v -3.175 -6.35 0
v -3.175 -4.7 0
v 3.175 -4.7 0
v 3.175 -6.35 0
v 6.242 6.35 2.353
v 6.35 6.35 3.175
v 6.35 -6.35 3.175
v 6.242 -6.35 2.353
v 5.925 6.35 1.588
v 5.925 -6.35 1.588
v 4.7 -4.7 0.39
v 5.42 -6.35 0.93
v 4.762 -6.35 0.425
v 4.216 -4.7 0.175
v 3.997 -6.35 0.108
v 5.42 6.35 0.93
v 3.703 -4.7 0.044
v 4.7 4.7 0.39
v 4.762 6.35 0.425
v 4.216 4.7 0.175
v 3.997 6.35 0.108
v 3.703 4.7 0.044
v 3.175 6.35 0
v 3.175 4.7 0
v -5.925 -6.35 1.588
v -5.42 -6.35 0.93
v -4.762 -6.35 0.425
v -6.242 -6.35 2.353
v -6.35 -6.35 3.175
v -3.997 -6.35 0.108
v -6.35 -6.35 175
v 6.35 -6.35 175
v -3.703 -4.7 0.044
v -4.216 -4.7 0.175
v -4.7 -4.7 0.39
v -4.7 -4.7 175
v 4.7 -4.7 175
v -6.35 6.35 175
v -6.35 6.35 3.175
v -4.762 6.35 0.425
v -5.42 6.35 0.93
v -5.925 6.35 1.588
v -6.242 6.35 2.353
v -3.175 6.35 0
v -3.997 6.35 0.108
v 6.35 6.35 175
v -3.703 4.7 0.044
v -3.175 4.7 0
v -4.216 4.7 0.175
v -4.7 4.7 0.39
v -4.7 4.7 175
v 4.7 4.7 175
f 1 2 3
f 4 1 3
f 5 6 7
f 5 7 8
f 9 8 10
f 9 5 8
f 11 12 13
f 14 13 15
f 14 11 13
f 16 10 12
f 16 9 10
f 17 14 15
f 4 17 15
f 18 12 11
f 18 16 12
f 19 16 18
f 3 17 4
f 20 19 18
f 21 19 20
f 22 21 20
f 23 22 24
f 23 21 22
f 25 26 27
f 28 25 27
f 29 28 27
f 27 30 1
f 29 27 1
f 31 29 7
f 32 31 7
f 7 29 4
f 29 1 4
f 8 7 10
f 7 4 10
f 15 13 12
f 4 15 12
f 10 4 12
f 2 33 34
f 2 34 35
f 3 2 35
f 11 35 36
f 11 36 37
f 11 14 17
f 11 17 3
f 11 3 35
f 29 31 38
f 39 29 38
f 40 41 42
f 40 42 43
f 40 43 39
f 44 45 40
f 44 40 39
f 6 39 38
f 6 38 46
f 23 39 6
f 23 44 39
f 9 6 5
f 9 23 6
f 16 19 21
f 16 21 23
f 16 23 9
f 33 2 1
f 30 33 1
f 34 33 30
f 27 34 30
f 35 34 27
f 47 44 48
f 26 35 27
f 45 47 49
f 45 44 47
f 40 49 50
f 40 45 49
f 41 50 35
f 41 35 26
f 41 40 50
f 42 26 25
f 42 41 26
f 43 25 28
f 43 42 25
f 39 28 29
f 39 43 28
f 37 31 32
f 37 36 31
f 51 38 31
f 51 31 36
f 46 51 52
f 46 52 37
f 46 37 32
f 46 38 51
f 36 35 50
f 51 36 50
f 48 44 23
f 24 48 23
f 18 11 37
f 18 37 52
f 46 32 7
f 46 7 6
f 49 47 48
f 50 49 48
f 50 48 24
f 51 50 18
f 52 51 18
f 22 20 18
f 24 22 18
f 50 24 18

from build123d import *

# Parameters (mm, degrees)
SKETCH1_W           = 12.7
SKETCH1_H           = 12.7
SKETCH1_W_2         = 9.4
SKETCH1_H_2         = 9.4
BOSS_EXTRUDE1_DEPTH = 175
CUT_EXTRUDE1_DEPTH  = 13.7


with BuildPart() as part:
    # Sketch1 → Boss-Extrude1 (new body)
    with BuildSketch(Plane.XY):
        Rectangle(SKETCH1_W, SKETCH1_H)
        Rectangle(SKETCH1_W_2, SKETCH1_H_2, mode=Mode.SUBTRACT)
    extrude(amount=BOSS_EXTRUDE1_DEPTH)

    # Sketch2 → Cut-Extrude1 (cut, through all)
    with BuildSketch(Plane(origin=(0, 6.35, 0), x_dir=(1, 0, 0), z_dir=(0, 1, 0))):
        with BuildLine():
            Line((-6.35, -3.175), (-6.35, 0))
            Line((-6.35, 0), (-3.175, 0))
            ThreePointArc((-3.175, 0), (-5.42006403, -0.92993597), (-6.35, -3.175))
        make_face()
        with BuildLine():
            Line((3.175, 0), (6.35, 0))
            Line((6.35, 0), (6.35, -3.175))
            ThreePointArc((6.35, -3.175), (5.42006403, -0.92993597), (3.175, 0))
        make_face()
    extrude(amount=-CUT_EXTRUDE1_DEPTH, mode=Mode.SUBTRACT)


solid = part.part
